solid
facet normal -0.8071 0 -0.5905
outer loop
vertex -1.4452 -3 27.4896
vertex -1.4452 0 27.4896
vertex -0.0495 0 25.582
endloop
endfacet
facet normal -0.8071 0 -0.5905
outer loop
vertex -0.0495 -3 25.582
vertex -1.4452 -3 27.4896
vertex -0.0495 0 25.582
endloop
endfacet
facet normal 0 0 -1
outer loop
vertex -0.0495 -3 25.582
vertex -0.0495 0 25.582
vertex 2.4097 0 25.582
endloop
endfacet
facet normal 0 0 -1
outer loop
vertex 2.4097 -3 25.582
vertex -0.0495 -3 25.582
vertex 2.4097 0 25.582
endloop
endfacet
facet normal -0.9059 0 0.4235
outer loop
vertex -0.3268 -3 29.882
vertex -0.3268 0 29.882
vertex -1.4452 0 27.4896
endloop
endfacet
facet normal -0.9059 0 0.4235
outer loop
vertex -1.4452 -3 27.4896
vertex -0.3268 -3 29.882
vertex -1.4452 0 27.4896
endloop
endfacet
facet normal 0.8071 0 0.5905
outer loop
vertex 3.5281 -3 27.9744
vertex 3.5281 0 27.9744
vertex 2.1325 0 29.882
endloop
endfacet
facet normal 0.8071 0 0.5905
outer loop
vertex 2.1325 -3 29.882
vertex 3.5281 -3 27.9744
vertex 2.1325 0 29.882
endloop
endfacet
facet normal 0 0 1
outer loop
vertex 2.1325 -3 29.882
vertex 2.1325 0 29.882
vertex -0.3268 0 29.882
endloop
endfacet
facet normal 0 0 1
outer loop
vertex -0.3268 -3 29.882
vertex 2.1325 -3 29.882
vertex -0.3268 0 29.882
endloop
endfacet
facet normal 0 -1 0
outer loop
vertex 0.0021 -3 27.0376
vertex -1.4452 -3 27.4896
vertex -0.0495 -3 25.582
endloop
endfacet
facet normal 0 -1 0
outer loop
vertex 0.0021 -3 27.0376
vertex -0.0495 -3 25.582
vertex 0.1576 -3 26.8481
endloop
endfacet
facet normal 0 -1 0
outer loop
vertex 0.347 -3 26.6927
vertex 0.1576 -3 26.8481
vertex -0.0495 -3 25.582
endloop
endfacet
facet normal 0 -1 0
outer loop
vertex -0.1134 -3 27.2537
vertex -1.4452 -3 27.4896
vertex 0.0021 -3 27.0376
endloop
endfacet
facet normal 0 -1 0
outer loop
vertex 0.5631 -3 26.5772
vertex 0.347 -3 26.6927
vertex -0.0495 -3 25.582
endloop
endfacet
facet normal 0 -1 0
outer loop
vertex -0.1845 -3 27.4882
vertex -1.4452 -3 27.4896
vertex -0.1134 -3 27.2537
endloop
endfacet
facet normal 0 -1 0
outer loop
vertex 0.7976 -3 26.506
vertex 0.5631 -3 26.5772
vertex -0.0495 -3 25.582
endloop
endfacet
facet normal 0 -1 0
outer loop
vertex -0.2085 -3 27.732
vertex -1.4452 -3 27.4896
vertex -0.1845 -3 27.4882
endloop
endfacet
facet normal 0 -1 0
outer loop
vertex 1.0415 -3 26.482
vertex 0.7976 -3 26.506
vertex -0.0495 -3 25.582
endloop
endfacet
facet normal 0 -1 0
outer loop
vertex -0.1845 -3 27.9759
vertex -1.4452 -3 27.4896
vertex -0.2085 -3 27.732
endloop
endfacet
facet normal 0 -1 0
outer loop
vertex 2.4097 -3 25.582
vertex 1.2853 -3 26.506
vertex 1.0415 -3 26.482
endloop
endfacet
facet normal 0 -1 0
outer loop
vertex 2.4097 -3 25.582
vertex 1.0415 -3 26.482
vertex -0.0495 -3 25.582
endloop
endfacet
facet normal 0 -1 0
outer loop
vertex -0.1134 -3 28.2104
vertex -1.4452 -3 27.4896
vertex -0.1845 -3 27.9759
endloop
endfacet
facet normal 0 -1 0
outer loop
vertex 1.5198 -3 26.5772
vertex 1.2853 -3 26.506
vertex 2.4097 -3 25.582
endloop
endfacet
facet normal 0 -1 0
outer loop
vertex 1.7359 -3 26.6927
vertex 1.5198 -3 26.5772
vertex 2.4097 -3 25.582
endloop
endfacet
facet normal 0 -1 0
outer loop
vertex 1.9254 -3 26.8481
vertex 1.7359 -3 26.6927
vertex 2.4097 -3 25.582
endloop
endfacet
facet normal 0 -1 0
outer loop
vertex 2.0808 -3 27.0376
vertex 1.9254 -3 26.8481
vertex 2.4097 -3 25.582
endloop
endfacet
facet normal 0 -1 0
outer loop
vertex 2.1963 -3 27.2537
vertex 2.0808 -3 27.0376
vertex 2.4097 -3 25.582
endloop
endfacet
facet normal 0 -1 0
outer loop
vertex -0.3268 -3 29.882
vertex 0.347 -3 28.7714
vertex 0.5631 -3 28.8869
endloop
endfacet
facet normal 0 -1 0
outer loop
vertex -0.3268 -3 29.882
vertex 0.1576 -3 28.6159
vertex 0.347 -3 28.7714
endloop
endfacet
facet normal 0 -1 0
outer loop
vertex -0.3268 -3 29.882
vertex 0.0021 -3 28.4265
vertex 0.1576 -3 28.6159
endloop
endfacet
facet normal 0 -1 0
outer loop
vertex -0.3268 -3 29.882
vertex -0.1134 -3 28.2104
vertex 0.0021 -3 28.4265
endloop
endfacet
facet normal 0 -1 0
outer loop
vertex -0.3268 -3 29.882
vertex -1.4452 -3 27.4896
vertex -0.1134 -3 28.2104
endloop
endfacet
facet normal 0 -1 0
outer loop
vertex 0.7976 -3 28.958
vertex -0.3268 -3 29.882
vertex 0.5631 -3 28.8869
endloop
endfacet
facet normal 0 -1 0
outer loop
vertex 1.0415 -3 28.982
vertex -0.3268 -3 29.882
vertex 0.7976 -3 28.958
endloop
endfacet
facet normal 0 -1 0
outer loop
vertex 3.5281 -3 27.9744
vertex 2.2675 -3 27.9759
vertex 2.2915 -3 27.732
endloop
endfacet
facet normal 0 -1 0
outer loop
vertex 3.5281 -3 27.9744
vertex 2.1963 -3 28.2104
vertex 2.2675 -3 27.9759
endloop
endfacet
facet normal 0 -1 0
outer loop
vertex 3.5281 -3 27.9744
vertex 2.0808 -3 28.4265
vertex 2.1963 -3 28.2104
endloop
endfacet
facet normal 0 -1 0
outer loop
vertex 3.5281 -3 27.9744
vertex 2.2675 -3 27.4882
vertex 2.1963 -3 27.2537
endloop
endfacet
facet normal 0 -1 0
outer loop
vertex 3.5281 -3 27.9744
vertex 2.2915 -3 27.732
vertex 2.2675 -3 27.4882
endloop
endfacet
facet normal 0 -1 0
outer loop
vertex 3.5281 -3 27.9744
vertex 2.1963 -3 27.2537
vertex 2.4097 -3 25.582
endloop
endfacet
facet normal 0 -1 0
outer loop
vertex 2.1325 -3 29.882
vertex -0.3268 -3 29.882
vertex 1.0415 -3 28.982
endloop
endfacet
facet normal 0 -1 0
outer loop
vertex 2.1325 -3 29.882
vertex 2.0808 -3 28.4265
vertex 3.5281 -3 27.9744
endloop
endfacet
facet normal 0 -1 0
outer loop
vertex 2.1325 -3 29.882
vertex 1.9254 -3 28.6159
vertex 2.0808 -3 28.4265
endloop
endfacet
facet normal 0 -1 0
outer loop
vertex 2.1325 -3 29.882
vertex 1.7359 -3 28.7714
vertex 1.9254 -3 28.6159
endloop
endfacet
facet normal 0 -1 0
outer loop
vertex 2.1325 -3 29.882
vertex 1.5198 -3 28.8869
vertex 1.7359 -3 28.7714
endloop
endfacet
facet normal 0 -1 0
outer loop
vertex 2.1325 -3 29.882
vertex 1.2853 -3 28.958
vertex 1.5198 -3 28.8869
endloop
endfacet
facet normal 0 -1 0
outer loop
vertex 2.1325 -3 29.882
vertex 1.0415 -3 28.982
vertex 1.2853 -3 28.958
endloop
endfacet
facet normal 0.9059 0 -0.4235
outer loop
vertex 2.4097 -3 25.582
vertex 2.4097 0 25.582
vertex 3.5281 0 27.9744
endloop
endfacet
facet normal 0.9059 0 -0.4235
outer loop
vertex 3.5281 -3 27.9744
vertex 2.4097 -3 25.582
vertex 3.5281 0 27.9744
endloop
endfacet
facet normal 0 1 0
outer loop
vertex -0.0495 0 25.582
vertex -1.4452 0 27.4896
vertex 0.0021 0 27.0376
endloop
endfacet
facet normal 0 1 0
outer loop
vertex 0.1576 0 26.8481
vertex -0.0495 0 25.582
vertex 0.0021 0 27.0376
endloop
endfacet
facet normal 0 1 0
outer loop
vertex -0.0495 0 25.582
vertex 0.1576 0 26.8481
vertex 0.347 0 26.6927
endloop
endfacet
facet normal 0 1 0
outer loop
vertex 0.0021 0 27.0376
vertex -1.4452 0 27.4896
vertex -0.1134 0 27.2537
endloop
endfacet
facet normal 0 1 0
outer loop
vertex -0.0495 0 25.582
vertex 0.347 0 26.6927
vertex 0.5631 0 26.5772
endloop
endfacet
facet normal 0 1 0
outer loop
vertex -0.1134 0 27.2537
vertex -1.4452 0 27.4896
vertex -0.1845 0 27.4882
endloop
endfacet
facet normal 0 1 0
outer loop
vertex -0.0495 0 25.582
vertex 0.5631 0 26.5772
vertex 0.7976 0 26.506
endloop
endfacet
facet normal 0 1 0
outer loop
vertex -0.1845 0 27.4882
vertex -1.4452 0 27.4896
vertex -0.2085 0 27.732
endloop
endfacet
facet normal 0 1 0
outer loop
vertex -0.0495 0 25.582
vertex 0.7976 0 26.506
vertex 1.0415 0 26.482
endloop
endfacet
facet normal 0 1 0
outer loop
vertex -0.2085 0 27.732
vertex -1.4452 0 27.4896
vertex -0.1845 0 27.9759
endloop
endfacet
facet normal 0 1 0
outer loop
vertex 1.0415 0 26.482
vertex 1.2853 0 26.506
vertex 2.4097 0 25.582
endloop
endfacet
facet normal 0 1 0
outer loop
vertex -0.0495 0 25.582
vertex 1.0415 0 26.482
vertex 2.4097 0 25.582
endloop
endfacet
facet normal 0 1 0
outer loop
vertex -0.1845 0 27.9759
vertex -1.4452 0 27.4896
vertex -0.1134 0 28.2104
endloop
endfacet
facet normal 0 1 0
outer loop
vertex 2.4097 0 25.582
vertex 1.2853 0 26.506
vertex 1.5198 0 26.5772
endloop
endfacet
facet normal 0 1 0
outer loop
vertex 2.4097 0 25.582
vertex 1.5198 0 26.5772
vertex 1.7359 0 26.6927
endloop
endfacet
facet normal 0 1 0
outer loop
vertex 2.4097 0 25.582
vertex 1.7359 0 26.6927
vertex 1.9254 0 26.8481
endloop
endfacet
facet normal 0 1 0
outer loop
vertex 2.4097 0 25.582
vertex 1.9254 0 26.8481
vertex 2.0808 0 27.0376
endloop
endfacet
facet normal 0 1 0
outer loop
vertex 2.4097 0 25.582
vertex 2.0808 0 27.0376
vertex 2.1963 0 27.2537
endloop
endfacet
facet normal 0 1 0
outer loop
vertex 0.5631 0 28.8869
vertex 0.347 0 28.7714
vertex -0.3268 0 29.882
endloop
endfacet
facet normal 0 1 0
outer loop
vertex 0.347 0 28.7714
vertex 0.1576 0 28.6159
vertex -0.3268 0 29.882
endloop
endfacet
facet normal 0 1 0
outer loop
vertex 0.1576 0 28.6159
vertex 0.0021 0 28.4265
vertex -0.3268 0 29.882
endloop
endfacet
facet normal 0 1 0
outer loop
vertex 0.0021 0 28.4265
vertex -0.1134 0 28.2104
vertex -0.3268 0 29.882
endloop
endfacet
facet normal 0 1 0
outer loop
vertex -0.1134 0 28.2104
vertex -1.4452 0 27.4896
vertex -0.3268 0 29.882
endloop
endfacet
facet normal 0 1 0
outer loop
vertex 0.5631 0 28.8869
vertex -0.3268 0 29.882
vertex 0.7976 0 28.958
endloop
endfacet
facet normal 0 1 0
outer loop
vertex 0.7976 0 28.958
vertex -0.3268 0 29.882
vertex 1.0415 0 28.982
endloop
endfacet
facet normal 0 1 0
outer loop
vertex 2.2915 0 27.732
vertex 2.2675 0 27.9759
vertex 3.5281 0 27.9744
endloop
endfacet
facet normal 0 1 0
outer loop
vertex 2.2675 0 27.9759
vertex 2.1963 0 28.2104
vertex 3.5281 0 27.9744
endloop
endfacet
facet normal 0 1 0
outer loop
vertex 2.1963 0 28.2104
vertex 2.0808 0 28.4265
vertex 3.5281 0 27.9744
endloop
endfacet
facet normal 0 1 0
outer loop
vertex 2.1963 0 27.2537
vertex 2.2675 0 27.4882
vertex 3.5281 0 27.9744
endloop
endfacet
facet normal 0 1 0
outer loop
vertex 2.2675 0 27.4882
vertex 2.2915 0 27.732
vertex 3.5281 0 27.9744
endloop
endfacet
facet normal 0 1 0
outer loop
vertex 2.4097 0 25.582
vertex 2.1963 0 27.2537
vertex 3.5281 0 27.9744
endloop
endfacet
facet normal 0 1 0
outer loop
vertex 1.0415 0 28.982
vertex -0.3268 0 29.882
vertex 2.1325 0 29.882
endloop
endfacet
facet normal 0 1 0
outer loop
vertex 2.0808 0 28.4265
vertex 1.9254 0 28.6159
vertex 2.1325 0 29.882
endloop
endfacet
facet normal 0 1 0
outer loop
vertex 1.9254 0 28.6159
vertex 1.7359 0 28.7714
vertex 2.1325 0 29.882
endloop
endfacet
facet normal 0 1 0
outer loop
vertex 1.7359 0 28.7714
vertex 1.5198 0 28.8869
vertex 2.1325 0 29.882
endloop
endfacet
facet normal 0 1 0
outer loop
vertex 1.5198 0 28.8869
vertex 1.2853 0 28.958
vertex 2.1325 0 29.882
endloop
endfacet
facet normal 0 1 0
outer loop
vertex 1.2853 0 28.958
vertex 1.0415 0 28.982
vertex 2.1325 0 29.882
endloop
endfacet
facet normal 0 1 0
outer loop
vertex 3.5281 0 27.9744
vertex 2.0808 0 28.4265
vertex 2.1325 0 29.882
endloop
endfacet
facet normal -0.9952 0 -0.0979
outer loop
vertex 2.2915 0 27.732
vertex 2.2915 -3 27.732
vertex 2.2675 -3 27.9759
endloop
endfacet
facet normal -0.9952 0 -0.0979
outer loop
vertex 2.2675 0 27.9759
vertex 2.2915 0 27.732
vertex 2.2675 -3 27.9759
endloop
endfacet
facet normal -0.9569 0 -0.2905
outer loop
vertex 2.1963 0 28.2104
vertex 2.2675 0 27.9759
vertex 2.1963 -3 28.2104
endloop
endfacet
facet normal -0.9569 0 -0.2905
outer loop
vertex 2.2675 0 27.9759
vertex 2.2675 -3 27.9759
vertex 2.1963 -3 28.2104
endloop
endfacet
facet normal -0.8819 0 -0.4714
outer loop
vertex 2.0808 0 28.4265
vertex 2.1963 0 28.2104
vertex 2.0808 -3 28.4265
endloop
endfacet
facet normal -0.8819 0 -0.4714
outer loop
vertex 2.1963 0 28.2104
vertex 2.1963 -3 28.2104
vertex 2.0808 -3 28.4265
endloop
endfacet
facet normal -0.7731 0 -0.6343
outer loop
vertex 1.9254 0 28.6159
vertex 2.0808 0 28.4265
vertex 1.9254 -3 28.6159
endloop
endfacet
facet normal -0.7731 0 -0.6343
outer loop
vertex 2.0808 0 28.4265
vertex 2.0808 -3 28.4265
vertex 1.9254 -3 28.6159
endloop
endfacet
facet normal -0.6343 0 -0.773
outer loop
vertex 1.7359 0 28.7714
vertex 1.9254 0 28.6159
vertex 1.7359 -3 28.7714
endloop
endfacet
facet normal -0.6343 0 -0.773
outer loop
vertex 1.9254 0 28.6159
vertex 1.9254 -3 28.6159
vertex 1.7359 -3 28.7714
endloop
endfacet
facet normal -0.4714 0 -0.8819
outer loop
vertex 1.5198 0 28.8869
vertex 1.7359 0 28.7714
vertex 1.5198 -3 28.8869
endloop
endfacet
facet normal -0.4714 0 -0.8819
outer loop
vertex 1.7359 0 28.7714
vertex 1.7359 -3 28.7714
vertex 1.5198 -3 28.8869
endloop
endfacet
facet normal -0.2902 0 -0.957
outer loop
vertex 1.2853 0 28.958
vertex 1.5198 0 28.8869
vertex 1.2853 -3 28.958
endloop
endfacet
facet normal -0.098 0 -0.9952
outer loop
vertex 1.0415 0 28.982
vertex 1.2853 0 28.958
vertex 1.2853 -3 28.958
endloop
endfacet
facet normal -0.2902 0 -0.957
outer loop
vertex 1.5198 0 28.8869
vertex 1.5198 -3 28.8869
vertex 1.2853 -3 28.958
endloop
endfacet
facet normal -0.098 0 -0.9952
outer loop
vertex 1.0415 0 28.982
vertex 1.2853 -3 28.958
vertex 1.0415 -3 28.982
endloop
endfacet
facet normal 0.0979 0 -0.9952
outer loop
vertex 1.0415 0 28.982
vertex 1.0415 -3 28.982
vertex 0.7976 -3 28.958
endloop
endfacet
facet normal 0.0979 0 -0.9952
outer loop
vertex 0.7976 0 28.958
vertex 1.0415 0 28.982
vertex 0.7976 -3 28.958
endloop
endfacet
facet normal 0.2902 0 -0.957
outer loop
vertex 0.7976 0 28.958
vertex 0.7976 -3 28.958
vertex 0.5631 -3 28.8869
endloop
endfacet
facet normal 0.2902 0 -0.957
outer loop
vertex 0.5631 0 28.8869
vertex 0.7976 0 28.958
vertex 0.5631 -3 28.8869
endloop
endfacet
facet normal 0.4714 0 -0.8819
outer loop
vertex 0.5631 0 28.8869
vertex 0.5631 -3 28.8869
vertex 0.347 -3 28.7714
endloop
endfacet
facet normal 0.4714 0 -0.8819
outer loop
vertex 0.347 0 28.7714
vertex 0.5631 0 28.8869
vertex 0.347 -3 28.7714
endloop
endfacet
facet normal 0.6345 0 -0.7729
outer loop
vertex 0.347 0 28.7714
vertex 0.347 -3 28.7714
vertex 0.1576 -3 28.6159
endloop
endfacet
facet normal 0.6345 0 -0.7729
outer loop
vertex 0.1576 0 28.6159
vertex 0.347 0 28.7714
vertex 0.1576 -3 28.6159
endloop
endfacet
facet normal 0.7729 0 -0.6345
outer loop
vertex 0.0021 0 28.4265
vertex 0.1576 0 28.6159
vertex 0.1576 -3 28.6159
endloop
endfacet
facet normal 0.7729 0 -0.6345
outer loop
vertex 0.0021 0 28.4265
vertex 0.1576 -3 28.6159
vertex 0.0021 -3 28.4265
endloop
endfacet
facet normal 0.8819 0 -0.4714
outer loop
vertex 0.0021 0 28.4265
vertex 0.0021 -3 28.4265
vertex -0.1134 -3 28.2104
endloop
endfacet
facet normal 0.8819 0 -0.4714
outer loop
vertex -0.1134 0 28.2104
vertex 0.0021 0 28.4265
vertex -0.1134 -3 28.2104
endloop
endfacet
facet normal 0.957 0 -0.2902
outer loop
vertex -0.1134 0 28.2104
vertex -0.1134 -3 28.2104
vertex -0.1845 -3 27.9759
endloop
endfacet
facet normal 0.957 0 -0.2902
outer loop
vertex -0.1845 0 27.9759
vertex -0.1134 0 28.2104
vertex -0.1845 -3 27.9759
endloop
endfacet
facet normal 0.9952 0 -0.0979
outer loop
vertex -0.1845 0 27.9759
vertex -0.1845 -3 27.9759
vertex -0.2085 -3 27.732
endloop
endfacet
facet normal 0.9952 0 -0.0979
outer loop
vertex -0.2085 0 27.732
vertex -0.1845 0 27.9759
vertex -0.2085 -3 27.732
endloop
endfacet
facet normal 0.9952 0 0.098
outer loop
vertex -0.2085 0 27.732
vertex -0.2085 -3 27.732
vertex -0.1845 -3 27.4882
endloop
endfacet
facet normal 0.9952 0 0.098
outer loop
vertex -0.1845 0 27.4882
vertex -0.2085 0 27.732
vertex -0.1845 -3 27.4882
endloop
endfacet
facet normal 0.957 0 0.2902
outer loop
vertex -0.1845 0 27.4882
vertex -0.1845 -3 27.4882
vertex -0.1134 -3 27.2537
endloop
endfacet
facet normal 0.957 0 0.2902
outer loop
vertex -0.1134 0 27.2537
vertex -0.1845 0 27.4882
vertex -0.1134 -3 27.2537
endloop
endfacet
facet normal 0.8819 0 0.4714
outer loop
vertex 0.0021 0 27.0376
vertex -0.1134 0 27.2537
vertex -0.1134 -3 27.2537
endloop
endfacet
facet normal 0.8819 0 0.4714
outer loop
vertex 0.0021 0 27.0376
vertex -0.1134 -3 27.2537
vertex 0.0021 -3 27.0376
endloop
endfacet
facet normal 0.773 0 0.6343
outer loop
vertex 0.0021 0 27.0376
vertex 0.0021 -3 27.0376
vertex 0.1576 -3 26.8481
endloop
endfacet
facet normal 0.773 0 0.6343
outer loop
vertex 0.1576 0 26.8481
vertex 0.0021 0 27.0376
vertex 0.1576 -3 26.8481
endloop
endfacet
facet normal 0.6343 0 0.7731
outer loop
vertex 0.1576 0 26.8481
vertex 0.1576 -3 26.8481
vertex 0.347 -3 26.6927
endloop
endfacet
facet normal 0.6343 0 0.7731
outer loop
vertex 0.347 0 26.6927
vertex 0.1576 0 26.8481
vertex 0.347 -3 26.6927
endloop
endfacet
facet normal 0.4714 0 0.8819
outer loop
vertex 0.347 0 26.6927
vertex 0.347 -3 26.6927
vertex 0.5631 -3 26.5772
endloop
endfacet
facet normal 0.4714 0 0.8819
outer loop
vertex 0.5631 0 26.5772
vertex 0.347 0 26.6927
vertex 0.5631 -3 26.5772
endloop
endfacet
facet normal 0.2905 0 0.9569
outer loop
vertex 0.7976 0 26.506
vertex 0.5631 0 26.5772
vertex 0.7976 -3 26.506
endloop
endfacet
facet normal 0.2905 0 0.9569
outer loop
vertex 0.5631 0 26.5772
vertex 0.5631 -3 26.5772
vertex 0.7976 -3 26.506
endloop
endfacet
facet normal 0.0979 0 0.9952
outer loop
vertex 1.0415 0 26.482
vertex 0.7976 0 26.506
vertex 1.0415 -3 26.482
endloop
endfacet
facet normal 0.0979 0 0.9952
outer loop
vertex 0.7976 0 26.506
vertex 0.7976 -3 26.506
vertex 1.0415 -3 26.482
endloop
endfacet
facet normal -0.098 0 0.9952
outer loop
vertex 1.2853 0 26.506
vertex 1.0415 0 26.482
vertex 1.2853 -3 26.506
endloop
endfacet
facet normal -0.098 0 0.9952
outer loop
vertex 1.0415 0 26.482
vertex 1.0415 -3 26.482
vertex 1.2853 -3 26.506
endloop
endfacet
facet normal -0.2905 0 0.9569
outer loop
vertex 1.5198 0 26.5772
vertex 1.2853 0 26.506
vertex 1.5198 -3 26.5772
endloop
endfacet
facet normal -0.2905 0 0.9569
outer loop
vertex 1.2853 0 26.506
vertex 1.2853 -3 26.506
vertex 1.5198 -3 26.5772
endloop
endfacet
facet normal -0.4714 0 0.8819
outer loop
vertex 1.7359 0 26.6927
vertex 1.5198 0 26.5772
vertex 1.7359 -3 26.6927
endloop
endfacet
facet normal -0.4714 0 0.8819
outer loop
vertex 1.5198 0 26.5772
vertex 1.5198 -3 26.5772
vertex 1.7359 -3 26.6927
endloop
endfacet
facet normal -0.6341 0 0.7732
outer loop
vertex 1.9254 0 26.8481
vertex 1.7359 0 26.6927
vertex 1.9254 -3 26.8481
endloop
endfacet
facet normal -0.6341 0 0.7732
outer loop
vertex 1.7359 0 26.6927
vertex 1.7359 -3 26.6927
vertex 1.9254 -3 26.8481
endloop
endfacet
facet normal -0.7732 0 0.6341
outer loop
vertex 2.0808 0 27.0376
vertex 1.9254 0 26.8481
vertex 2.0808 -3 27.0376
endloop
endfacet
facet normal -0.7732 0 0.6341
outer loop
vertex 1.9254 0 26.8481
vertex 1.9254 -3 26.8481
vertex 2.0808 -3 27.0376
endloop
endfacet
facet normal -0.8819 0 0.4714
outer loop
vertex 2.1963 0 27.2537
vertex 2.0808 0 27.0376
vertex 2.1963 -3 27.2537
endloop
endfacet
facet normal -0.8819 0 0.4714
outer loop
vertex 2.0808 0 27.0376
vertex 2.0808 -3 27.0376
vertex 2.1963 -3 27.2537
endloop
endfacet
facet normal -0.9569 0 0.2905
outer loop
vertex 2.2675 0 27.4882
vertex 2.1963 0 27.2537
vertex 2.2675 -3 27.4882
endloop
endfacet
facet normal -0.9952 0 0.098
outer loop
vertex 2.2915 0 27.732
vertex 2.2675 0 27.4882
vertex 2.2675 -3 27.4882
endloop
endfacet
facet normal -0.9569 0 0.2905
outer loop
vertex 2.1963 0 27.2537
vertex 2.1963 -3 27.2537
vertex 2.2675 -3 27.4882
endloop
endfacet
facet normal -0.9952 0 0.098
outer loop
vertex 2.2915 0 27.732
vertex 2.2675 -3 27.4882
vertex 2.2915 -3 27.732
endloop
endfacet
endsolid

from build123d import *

# Parameters (mm, degrees)
F1_DEPTH = 3
F2_R     = 1.25
F3_DEPTH = 25


with BuildPart() as f1:
    # F0 (on Front) → F1 (new body)
    with BuildSketch(Plane.XZ):
        Polygon((2.132456, 29.882024), (-0.326764, 29.882024), (-1.445175, 27.489626), (-0.049504, 25.582024), (2.409716, 25.582024), (3.528127, 27.974421), align=None)
    extrude(amount=F1_DEPTH)

    # F2 (on face) → F3 (cut)
    with BuildSketch(Plane.XZ.offset(3)):
        with Locations((1.041476, 27.732024)):
            Circle(F2_R)
    extrude(amount=-F3_DEPTH, mode=Mode.SUBTRACT)


solid = f1.part
